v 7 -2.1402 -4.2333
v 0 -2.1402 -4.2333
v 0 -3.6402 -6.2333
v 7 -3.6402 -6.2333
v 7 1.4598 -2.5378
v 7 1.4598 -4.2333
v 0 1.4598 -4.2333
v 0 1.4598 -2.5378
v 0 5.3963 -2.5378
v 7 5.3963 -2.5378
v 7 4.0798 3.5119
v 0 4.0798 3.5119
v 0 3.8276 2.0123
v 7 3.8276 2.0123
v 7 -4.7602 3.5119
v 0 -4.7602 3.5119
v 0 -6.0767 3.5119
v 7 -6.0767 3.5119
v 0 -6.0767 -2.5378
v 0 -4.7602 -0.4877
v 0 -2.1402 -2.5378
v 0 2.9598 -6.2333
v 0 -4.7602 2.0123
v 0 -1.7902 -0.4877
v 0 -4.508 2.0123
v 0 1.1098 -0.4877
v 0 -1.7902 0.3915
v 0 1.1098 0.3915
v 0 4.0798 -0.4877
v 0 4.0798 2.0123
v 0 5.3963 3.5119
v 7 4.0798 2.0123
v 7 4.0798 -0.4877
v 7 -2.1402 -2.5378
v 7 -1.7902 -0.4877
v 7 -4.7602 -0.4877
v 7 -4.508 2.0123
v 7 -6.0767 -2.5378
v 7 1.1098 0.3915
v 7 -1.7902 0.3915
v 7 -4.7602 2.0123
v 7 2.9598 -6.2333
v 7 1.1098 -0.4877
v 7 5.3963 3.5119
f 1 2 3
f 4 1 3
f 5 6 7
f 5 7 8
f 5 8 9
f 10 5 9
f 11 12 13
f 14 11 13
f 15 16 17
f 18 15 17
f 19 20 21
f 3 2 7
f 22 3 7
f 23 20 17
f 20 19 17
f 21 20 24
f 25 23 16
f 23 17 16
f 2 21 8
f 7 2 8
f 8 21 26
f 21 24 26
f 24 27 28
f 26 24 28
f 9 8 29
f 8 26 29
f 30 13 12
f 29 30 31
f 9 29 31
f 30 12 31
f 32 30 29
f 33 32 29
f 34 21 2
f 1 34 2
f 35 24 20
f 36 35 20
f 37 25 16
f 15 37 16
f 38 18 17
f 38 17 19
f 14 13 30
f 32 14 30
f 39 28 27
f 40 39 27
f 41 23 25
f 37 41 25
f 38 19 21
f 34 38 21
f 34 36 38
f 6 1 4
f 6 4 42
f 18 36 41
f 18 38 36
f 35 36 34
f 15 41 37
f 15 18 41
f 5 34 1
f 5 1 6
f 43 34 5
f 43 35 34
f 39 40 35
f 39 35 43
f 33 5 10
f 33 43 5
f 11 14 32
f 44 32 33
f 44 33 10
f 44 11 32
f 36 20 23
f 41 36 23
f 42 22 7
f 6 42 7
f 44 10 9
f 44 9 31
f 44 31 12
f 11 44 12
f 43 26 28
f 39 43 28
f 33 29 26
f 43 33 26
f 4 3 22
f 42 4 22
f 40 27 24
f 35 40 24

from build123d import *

# Parameters (mm, degrees)
F0_W     = 3.6
F0_H     = 1.6955656027
F0_H_2   = 2
F1_DEPTH = 7


with BuildPart() as f1:
    # F0 (on Right) → F1 (new body)
    with BuildSketch(Plane.YZ):
        with Locations((-0.3402145463, -3.3855575087)):
            Rectangle(F0_W, F0_H)
        with Locations((-0.3402145463, -5.2333403101)):
            Rectangle(F0_W, F0_H_2)
        Polygon((-2.1402145463, -6.2333403101), (-2.1402145463, -4.2333403101), (-3.6402145463, -6.2333403101), align=None)
        Polygon((-3.3397897729, -2.5377747074), (-2.1402145463, -2.5377747074), (1.4597854537, -2.5377747074), (2.6593606802, -2.5377747074), (2.6593606802, -0.4877204478), (1.1097854537, -0.4877204478), (-0.3402145463, -0.4877204478), (-1.7902145463, -0.4877204478), (-3.3397897729, -0.4877204478), align=None)
        Polygon((2.9597854537, -6.2333403101), (1.4597854537, -4.2333403101), (1.4597854537, -6.2333403101), align=None)
        Polygon((-3.3402145463, -2.5377747074), (-3.3397897729, -2.5377747074), (-3.3397897729, -0.4877204478), (-4.7602145463, -0.4877204478), (-4.7602145463, 2.0122795522), (-4.508031692, 2.0122795522), (-4.7602145463, 3.5118722885), (-6.076728541, 3.5118722885), (-6.076728541, -2.5377747074), align=None)
        Polygon((2.6593606802, -0.4877204478), (2.6593606802, -2.5377747074), (2.6597854537, -2.5377747074), (5.3962994483, -2.5377747074), (5.3962994483, 3.5118722885), (4.0797854537, 3.5118722885), (3.8276025993, 2.0122795522), (4.0797854537, 2.0122795522), (4.0797854537, -0.4877204478), align=None)
        Polygon((-1.7902145463, 0.3914704144), (-1.7902145463, -0.4877204478), (-0.3402145463, -0.4877204478), (1.1097854537, -0.4877204478), (1.1097854537, 0.3914704144), (-0.3402145463, 0.3914704144), align=None)
    extrude(amount=F1_DEPTH)


solid = f1.part
